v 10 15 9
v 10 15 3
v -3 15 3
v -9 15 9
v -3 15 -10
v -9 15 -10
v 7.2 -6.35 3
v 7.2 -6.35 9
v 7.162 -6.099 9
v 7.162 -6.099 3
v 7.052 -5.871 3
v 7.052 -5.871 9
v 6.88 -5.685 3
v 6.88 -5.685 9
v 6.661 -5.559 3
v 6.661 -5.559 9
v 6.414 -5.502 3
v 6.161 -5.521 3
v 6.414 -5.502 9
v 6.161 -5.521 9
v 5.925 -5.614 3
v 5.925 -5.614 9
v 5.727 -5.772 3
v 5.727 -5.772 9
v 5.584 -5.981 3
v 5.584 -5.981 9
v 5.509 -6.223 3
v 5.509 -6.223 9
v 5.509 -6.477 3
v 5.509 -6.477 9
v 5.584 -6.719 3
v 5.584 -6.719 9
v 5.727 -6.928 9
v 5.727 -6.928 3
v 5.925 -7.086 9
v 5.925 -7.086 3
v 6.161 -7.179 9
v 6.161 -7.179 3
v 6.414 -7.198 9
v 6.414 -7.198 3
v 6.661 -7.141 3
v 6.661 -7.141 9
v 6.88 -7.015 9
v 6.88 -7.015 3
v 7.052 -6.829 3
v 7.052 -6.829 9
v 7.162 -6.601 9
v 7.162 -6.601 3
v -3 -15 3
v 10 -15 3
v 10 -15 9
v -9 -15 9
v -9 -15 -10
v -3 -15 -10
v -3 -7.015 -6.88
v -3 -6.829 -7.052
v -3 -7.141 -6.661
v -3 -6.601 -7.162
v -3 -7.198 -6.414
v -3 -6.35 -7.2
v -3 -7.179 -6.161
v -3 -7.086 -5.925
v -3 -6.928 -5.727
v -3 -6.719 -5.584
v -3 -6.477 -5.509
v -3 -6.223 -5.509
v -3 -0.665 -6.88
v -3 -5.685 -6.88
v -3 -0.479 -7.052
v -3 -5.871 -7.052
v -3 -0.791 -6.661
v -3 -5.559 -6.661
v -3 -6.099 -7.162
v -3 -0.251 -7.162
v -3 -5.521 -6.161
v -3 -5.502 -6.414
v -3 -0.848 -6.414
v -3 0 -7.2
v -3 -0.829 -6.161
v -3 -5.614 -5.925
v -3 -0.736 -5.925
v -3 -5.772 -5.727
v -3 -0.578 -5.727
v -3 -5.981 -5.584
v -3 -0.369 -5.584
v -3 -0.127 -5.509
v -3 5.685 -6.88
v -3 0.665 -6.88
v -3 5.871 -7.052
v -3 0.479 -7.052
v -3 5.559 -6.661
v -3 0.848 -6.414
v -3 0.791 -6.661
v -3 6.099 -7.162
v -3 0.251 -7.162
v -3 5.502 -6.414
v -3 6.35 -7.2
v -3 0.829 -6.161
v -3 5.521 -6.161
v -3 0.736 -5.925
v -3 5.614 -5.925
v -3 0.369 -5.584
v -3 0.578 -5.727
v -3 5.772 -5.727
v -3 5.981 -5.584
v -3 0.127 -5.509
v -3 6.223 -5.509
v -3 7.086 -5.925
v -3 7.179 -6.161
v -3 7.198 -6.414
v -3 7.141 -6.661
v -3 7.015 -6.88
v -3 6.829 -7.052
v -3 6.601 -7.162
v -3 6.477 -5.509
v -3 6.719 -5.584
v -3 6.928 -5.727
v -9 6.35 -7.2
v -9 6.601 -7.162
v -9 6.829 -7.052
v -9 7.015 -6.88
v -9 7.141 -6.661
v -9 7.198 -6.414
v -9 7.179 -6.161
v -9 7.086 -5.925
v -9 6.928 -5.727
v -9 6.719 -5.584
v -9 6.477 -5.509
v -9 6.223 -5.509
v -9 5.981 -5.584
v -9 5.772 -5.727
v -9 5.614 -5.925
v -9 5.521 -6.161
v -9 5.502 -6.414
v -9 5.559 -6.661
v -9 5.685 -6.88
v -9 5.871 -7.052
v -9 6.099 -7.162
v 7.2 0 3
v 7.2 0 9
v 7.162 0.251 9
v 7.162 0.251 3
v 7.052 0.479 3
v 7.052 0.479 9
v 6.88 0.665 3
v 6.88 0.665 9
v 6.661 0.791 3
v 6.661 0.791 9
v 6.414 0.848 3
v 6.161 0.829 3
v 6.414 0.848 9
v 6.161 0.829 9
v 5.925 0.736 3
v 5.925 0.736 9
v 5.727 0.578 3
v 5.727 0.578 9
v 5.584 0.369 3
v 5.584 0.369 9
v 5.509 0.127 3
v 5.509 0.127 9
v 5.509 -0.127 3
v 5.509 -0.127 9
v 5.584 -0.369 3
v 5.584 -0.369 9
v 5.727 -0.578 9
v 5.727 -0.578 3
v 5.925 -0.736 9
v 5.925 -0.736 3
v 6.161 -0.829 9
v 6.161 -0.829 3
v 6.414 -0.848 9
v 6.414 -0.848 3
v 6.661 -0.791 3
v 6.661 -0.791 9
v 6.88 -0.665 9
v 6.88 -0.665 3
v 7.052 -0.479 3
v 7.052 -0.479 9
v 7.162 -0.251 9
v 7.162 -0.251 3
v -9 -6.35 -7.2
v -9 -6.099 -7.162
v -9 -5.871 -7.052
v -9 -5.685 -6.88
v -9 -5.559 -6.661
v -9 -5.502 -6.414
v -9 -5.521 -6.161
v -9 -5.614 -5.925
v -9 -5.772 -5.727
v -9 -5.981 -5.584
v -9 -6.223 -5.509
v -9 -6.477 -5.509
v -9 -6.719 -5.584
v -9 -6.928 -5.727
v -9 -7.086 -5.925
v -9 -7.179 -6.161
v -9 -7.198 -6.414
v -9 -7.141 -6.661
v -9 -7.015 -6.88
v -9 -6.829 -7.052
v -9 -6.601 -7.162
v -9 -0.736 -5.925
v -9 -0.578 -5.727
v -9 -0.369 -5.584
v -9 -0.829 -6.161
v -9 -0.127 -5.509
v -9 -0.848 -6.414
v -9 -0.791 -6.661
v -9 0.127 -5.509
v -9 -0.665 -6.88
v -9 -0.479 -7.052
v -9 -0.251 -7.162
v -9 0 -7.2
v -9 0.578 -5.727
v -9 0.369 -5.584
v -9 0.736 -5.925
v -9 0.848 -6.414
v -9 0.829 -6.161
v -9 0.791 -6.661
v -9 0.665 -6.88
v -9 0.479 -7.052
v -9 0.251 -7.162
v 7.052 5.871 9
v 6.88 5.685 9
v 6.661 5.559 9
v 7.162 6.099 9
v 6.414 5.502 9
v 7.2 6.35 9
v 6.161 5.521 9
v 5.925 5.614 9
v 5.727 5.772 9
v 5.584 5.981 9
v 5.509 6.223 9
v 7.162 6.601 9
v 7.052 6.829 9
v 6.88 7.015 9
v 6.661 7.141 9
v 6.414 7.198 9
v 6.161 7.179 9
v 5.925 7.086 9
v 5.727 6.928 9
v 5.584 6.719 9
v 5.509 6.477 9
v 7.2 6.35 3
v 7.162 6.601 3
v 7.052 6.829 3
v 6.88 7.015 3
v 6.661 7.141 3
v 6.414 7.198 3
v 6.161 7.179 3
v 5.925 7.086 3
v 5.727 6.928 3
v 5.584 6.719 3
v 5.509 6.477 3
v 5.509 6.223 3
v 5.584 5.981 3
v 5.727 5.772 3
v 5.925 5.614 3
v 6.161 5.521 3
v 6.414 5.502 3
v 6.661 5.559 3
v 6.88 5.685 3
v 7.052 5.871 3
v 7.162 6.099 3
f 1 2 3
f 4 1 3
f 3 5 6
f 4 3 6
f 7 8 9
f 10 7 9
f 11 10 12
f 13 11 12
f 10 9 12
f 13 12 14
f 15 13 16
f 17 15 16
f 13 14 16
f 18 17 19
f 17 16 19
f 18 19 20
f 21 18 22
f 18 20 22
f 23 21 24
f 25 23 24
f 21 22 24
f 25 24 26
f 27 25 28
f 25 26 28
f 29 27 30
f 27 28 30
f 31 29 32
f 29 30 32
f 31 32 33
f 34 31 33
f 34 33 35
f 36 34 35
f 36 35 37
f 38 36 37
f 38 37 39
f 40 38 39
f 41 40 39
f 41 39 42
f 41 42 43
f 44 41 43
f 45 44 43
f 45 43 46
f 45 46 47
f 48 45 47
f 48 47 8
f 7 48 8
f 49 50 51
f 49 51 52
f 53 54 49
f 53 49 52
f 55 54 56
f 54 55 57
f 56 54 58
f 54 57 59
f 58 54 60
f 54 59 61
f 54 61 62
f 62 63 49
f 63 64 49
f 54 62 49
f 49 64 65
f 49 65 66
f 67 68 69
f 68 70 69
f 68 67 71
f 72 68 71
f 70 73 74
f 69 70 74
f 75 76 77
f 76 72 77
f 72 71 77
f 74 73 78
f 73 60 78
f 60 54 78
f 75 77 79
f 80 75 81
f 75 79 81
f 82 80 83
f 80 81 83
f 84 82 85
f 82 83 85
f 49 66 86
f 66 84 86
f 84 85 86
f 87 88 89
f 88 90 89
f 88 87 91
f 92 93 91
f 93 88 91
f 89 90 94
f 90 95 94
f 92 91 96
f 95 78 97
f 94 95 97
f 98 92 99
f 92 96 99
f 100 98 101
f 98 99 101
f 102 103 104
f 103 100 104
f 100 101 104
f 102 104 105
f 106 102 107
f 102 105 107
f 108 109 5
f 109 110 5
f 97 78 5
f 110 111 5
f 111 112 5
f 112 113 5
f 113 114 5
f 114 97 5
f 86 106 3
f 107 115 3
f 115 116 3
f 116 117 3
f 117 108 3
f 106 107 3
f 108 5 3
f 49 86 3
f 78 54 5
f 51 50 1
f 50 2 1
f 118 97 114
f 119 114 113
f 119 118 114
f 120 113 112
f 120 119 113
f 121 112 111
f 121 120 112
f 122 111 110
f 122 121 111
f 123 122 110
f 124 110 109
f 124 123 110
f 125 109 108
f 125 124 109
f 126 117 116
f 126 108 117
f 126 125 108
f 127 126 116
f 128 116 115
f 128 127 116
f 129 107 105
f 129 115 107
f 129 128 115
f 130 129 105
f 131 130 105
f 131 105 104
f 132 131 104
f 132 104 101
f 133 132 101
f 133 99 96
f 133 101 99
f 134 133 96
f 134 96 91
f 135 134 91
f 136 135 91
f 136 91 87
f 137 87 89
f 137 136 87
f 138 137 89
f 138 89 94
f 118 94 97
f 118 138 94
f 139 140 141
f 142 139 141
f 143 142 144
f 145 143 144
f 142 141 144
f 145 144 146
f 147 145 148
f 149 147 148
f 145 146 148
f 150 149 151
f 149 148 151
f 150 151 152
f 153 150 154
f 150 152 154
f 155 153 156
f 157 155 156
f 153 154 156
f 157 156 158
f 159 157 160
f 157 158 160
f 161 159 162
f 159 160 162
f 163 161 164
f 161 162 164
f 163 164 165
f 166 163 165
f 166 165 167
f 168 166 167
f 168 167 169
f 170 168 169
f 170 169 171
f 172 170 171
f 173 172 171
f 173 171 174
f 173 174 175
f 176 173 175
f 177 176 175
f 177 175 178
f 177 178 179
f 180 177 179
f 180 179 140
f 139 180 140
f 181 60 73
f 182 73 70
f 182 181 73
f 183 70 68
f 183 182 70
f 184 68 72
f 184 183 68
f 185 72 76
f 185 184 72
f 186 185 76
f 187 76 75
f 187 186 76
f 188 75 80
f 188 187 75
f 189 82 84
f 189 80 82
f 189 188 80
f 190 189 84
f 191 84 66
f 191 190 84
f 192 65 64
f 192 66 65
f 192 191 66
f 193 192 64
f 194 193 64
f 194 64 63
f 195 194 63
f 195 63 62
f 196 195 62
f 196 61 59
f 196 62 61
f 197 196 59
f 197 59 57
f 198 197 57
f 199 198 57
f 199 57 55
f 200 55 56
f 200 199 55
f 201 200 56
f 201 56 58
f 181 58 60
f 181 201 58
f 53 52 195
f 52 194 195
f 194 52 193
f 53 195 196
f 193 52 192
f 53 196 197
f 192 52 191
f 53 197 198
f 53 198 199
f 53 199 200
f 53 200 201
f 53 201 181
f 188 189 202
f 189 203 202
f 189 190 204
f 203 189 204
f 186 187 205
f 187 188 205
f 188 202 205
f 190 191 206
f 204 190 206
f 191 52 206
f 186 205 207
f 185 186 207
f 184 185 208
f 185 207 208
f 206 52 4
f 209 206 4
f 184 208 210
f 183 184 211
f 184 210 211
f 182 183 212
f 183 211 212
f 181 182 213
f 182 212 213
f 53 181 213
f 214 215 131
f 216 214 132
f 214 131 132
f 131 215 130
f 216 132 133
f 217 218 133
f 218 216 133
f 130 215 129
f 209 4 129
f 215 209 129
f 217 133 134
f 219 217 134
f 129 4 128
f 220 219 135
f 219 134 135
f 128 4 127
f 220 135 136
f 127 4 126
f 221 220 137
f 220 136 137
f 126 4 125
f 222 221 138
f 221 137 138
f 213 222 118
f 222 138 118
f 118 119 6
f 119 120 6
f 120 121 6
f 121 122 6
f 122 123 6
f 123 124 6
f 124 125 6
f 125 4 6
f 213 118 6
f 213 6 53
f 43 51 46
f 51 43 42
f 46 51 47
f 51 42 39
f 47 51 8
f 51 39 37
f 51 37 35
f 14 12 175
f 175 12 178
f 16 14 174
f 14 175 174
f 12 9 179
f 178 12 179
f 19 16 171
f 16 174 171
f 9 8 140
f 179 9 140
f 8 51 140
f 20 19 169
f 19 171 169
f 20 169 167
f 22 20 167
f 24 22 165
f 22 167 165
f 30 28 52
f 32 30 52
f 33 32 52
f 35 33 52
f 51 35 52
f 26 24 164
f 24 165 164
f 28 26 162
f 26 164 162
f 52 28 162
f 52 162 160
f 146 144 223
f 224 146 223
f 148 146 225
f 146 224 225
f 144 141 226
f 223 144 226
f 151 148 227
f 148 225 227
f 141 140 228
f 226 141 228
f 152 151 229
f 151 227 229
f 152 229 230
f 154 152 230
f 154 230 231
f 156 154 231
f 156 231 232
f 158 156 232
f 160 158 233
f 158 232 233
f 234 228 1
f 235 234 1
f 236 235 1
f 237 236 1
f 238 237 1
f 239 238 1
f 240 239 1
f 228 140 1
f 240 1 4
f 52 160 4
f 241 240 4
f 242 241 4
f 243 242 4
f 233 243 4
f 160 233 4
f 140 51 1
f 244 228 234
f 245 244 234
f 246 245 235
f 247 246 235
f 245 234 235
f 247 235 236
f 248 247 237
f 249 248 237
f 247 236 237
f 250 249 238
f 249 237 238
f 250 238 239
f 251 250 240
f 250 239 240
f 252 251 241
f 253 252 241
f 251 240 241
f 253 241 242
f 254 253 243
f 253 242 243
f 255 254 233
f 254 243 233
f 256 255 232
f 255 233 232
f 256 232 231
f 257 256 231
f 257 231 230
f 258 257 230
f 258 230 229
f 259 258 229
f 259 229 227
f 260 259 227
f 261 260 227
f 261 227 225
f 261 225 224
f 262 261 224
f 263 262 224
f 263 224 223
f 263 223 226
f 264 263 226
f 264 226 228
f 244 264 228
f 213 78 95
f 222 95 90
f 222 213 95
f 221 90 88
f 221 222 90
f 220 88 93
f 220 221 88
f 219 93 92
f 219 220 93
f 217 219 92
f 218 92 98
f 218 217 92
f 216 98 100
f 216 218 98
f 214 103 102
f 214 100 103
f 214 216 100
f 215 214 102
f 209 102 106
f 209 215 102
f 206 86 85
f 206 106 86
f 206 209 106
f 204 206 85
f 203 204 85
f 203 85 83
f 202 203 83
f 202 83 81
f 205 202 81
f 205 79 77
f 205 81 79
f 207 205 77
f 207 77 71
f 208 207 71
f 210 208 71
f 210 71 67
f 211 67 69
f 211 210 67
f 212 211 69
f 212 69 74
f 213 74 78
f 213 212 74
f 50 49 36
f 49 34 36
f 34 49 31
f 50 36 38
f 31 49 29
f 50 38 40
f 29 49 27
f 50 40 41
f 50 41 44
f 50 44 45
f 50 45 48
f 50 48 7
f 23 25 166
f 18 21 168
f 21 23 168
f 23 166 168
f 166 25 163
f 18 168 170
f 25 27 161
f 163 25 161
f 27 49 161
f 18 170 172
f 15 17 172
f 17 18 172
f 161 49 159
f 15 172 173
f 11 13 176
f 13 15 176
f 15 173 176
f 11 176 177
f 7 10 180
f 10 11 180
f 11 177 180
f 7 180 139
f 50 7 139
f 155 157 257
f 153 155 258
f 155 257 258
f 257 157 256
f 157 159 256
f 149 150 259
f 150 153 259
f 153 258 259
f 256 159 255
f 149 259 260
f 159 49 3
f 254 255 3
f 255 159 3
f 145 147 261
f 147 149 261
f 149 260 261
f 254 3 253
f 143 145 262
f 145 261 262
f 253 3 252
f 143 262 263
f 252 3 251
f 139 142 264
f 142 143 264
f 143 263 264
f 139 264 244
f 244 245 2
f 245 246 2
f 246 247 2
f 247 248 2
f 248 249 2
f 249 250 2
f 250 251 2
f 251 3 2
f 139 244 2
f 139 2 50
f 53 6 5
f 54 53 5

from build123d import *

# Parameters (mm, degrees)
BOSS_EXTRUDE1_DEPTH = 15
SKETCH2_R           = 0.85
CUT_EXTRUDE1_DEPTH  = 20


with BuildPart() as part:
    # Sketch1 → Boss-Extrude1 (new body, symmetric)
    with BuildSketch(Plane(origin=(0, 0, 0), x_dir=(1, 0, 0), z_dir=(0, 1, 0))):
        Polygon((-3, 10), (-3, -3), (10, -3), (10, -9), (-9, -9), (-9, 10), align=None)
    extrude(amount=BOSS_EXTRUDE1_DEPTH, both=True)

    # Sketch2 → Cut-Extrude1 (cut, through all)
    with BuildSketch(Plane.XY.offset(9)):
        with Locations((6.35, 6.35)):
            Circle(SKETCH2_R)
        with Locations((6.35, 0)):
            Circle(SKETCH2_R)
        with Locations((6.35, -6.35)):
            Circle(SKETCH2_R)
    cut_extrude1 = extrude(amount=-CUT_EXTRUDE1_DEPTH, mode=Mode.SUBTRACT)

    # Mirror1: Cut-Extrude1 across plane
    add(cut_extrude1.mirror(Plane(origin=(0, 0, 0), x_dir=(-0.707106781, 0, 0.707106781), z_dir=(0.707106781, 0, 0.707106781))), mode=Mode.SUBTRACT)


solid = part.part
